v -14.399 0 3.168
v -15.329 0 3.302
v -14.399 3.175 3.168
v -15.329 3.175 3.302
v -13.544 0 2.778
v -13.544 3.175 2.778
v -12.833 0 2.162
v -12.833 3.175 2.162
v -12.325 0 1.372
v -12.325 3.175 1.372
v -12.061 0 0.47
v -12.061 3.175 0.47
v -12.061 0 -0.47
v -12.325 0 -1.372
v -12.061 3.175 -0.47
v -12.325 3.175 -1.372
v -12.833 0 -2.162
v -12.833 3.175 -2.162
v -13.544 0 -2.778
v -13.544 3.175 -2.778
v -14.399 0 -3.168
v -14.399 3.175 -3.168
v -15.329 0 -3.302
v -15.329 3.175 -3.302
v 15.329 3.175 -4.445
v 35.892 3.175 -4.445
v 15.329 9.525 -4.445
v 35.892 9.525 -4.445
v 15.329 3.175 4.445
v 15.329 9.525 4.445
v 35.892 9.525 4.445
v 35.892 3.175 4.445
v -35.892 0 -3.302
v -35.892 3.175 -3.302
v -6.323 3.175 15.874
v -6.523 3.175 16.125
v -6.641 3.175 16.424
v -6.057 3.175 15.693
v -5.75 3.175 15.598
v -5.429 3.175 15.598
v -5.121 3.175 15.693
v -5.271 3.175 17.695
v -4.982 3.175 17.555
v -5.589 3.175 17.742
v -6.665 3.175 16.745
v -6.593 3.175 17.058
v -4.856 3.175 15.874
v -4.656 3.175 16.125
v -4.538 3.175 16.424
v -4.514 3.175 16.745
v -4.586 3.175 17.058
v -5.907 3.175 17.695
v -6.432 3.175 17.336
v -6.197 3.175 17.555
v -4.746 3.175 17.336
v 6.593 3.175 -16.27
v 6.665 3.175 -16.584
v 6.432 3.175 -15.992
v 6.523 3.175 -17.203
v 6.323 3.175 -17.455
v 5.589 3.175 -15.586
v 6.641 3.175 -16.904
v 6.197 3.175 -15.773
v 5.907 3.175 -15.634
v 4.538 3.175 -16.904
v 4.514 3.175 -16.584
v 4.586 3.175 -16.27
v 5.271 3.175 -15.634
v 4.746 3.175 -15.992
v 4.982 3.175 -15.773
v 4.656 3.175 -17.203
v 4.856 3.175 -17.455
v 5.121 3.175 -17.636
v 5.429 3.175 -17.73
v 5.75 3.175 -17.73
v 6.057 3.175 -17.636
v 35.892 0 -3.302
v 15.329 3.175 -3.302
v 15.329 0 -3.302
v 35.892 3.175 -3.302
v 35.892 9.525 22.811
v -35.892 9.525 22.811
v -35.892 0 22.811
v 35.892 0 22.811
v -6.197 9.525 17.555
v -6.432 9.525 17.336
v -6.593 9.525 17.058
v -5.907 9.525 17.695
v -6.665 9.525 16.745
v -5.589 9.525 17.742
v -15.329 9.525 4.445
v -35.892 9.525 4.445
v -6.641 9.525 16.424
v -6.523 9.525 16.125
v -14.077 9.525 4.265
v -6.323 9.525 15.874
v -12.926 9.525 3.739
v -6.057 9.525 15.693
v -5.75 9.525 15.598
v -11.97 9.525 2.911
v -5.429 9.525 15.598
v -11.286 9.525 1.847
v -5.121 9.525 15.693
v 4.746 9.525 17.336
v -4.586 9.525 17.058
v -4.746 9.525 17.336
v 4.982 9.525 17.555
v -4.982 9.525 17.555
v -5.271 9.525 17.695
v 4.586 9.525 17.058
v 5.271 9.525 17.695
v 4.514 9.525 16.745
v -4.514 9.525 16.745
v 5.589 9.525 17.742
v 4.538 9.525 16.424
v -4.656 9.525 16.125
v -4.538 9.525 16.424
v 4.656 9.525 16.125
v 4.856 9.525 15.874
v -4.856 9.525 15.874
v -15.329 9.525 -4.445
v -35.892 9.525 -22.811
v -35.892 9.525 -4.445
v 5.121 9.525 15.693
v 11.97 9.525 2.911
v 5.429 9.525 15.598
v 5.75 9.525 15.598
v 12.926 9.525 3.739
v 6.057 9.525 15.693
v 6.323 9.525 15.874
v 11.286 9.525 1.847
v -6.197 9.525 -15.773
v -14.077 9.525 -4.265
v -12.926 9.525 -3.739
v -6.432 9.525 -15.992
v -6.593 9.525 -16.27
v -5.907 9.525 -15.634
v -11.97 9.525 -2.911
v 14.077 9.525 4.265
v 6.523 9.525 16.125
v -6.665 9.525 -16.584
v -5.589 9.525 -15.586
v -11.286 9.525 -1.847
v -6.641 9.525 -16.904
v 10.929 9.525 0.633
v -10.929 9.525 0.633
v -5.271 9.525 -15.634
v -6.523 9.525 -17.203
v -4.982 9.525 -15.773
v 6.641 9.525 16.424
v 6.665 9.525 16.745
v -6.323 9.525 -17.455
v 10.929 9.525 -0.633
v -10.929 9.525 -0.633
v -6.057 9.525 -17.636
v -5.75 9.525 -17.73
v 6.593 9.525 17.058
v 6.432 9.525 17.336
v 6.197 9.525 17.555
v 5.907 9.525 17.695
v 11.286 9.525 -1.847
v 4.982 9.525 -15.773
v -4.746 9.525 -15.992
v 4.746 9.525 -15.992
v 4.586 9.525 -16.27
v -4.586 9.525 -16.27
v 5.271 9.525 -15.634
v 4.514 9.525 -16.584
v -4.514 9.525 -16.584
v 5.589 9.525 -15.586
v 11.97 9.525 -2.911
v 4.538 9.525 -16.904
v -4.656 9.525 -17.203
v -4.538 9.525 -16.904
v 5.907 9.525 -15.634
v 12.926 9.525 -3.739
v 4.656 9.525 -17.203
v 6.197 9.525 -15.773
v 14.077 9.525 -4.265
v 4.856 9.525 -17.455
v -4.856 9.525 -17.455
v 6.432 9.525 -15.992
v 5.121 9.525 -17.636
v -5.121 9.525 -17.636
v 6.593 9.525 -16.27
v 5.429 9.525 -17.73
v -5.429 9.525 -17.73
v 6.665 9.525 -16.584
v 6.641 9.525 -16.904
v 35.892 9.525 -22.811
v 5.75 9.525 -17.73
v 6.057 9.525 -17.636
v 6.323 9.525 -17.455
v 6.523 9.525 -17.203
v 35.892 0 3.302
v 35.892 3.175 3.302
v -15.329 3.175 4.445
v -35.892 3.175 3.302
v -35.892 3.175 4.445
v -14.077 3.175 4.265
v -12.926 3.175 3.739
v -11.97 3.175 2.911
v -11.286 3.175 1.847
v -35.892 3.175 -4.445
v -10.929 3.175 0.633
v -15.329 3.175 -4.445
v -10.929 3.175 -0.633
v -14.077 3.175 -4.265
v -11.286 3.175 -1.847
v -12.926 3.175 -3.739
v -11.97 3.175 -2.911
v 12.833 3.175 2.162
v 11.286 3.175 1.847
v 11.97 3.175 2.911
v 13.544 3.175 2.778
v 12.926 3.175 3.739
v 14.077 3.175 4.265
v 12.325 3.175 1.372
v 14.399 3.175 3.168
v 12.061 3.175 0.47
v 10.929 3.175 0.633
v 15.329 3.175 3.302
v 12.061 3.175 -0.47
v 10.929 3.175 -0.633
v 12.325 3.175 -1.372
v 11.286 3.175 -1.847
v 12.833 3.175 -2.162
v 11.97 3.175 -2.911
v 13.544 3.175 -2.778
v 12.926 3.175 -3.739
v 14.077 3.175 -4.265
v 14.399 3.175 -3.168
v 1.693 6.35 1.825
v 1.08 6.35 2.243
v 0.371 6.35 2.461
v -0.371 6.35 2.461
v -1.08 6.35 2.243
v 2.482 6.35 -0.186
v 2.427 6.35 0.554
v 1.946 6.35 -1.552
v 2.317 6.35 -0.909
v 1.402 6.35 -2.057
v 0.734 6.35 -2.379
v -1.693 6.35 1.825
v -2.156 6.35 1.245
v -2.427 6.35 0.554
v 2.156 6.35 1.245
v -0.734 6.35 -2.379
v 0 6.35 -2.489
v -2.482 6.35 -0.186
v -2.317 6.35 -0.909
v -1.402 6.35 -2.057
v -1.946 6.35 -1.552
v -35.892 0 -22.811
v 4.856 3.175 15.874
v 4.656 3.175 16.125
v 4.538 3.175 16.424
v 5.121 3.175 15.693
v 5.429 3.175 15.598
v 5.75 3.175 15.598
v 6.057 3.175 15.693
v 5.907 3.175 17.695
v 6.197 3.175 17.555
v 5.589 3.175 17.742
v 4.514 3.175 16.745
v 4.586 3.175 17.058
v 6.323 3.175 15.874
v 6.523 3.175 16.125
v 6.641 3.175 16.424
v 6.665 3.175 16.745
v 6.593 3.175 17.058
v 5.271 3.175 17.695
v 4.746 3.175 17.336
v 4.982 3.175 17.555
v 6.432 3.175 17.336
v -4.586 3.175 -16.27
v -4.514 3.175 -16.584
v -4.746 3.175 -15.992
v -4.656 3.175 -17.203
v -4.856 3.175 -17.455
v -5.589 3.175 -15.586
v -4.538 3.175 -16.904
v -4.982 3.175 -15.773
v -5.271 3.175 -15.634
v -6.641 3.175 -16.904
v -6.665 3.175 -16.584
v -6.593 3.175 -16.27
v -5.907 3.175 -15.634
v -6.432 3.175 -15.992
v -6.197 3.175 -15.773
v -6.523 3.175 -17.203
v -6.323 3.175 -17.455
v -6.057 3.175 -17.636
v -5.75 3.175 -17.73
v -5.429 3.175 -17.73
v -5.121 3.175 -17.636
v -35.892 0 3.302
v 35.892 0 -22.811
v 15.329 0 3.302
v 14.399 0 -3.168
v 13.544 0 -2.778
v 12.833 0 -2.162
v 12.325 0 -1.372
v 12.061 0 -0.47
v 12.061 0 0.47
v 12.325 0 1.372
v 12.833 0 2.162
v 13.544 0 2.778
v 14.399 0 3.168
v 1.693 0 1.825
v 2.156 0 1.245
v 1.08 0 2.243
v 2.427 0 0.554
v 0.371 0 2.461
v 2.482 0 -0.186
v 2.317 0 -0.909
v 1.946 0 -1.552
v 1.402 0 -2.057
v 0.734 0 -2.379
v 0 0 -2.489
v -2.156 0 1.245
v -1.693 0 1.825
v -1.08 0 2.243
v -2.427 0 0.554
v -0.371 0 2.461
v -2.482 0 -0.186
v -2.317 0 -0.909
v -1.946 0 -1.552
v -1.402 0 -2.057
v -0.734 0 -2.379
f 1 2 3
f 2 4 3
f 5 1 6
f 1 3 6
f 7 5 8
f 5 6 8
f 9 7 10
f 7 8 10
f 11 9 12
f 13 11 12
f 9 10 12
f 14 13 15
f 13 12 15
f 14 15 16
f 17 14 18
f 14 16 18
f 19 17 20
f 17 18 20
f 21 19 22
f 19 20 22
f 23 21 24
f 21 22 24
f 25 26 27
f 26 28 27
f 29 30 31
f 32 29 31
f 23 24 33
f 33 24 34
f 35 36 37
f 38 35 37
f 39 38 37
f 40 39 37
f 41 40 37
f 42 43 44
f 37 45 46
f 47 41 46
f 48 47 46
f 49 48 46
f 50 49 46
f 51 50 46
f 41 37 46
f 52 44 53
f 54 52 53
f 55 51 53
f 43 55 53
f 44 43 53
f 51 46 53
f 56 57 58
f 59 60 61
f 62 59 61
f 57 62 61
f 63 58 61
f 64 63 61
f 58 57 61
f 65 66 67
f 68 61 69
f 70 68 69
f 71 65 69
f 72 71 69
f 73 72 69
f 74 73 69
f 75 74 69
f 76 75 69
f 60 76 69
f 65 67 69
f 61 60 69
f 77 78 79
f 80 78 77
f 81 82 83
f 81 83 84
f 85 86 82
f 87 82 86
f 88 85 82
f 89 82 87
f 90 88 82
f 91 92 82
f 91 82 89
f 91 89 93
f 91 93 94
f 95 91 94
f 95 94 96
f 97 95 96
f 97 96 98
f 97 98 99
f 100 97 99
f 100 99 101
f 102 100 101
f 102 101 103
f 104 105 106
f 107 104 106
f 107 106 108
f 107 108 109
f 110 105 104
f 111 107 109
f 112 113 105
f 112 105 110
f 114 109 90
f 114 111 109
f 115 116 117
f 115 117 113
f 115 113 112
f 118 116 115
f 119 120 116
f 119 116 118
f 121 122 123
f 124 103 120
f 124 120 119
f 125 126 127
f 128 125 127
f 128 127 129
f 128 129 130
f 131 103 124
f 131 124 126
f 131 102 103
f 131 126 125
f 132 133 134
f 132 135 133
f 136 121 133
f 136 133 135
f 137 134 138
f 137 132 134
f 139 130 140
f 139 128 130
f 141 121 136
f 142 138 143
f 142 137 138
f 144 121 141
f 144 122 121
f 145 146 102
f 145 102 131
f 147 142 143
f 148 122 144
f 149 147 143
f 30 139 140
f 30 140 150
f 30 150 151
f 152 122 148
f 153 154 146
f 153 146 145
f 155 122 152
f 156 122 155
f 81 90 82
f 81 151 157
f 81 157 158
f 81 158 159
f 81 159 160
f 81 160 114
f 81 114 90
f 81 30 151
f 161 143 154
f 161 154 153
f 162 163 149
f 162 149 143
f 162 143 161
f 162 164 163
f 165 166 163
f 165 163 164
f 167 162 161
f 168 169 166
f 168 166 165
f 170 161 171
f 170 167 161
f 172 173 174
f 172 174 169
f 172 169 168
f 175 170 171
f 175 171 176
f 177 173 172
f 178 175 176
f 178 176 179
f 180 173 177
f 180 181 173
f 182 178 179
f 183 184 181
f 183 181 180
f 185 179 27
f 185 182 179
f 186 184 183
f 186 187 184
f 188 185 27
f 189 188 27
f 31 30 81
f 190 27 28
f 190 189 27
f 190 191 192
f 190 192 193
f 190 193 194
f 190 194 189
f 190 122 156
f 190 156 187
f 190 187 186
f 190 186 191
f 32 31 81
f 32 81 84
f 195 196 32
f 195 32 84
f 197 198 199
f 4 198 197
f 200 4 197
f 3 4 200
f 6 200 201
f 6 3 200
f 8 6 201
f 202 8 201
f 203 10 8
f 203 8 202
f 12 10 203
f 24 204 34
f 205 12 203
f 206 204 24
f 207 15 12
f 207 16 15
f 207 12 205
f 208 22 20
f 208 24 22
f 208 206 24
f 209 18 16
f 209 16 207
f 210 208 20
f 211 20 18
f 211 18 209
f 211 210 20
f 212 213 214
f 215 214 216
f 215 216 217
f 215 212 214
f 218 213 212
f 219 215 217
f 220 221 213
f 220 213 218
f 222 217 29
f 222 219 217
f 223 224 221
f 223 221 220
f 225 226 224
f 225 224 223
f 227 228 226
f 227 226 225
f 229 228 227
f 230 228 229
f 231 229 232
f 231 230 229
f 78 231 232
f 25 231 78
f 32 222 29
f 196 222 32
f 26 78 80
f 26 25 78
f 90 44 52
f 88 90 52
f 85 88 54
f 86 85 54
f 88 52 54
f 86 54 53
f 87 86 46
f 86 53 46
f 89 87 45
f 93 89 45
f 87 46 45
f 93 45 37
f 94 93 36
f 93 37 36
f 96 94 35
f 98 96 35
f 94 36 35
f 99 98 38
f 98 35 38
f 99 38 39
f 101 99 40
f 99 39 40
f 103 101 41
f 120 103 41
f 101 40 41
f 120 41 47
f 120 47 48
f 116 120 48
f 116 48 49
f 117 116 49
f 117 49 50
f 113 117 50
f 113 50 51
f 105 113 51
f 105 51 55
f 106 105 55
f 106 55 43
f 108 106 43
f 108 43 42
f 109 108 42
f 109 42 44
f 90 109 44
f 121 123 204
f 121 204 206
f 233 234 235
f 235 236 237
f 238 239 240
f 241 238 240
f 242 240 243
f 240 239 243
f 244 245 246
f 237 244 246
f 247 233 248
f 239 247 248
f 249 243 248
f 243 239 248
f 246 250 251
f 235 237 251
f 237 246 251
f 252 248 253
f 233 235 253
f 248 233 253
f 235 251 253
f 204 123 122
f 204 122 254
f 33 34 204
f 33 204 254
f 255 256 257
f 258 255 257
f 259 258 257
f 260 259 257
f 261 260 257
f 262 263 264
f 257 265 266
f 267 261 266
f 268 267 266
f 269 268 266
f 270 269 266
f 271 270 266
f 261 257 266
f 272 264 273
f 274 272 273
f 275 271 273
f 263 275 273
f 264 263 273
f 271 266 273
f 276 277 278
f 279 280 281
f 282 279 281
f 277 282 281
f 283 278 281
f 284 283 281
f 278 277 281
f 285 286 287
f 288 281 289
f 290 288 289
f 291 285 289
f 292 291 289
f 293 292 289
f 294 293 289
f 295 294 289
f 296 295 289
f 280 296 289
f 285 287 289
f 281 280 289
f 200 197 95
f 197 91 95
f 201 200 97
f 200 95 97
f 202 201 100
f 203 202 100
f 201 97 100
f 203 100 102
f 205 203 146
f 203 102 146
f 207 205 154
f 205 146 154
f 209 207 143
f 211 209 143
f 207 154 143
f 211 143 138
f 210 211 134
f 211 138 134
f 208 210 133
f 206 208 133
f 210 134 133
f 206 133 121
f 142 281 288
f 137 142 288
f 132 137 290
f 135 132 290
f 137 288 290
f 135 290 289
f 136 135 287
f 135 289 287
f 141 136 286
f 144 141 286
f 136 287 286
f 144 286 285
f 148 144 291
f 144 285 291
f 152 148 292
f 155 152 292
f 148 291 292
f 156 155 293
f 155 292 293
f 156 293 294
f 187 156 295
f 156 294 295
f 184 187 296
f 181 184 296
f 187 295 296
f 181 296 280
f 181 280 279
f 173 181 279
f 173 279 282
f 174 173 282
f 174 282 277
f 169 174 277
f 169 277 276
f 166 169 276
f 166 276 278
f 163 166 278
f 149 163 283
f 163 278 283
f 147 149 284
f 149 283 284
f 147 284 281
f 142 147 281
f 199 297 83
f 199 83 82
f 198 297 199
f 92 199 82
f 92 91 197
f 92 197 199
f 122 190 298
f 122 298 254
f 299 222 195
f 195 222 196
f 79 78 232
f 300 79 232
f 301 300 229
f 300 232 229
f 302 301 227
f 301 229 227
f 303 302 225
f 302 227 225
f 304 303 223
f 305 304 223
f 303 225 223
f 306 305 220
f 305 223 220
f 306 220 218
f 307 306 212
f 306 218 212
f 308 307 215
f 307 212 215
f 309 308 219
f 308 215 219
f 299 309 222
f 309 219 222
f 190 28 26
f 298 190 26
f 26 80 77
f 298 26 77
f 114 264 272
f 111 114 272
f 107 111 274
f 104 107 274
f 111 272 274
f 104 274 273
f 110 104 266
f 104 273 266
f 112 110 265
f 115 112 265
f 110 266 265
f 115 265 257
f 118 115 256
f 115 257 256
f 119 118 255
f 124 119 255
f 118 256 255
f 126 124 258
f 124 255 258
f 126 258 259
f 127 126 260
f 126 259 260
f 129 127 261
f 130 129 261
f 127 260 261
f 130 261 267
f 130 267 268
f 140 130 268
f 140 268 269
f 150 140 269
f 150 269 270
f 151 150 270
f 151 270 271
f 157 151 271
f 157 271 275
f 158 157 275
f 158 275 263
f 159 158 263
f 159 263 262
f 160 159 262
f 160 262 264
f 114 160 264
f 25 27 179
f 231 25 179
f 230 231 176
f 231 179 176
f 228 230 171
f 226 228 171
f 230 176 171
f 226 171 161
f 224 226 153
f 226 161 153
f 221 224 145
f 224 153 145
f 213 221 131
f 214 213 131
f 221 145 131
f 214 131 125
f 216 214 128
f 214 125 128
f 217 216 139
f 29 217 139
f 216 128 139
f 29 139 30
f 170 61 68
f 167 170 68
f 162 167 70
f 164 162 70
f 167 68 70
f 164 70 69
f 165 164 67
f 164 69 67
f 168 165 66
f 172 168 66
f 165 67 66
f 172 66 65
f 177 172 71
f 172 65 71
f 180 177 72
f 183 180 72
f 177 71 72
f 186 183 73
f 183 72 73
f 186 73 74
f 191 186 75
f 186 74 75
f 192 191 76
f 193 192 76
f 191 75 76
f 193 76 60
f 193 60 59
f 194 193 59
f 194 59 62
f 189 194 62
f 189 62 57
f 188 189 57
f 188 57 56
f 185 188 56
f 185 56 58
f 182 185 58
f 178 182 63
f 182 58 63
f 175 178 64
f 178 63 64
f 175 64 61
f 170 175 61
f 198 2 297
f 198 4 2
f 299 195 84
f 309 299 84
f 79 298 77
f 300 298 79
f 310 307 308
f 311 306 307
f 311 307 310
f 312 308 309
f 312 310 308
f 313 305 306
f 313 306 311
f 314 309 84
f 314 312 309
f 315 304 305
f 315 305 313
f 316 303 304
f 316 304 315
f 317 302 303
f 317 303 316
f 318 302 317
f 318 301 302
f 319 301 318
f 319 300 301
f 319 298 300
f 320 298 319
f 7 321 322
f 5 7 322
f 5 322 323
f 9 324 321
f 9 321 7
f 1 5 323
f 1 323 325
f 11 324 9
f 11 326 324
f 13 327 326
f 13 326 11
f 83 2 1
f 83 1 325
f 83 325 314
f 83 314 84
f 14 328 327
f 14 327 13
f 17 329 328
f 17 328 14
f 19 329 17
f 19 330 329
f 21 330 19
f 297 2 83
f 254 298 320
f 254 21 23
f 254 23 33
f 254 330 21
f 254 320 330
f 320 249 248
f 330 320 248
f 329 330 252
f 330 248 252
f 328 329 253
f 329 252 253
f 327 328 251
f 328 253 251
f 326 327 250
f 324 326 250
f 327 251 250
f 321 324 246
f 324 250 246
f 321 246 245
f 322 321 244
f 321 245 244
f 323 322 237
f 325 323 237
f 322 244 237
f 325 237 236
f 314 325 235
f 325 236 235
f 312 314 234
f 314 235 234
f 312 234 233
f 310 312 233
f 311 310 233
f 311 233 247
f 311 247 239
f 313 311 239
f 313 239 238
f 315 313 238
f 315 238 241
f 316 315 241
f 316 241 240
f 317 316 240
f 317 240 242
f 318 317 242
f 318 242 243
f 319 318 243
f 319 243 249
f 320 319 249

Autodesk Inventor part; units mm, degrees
ref_plane "YZ Plane" through (0, 0, 0) normal (1, 0, 0) x (0, 1, 0)
ref_plane "XZ Plane" through (0, 0, 0) normal (0, 1, 0) x (-1, 0, 0)
ref_plane "XY Plane" through (0, 0, 0) normal (0, 0, 1) x (1, 0, 0)
sketch "Sketch1" plane through (0, 0, 0) normal (0, 1, 0) x (-1, 0, 0)
  line L0 (22.9489, 20.701) -> (-22.9489, 20.701)
  line L1 (-22.9489, 20.701) -> (-22.9489, -20.701)
  line L2 (-22.9489, -20.701) -> (22.9489, -20.701)
  line L3 (22.9489, -20.701) -> (22.9489, 20.701)
  line L4 (22.9489, 20.701) -> (-22.9489, -20.701) construction
  line L5 (-22.9489, 20.701) -> (22.9489, -20.701) construction
  point P0 (0, 0)
  dimension "d0" = 45.8978
  dimension "d1" = 41.402
extrude "Extrusion1" add sketch "Sketch1" along normal blind 9.525
hole "Hole1" at (0, 0, 0) direction (0, 1, 0) diameter 4.9784 depth 6.35 thread size "1/4-20 UNC" class "2B" standard "ANSI Unified Screw Threads"
sketch "Sketch11" plane through (-22.9489, 0, 20.701) normal (0, 0, 1) x (1, 0, 0)
  line L0 (45.8978, 9.525) -> (0, 9.525) projected
  line L1 (45.8978, 0) -> (0, 0) projected
  line L2 (0, 9.525) -> (45.8978, 9.525)
  line L3 (45.8978, 9.525) -> (45.8978, 0)
  line L4 (45.8978, 0) -> (0, 0)
  line L5 (0, 0) -> (0, 9.525)
  point P0 (22.9489, 0)
extrude "Extrusion6" cut sketch "Sketch11" against normal blind 3.175
sketch "Sketch12" plane through (22.9489, 0, -20.701) normal (0, 0, -1) x (-1, 0, 0)
  line L0 (0, 9.525) -> (45.8978, 9.525) projected
  line L1 (45.8978, 0) -> (45.8978, 9.525) projected
  line L2 (0, 9.525) -> (45.8978, 9.525)
  line L3 (45.8978, 9.525) -> (45.8978, 0)
  line L4 (45.8978, 0) -> (0, 0)
  line L5 (0, 0) -> (0, 9.525)
  point P0 (22.9489, 0)
extrude "Extrusion7" cut sketch "Sketch12" against normal blind 3.175
sketch "Sketch13" plane through (22.9489, 0, 17.526) normal (1, 0, 0) x (0, 0, -1)
  line L0 (0, 9.525) -> (0, 0) projected
  line L1 (35.052, 0) -> (0, 0) projected
  line L2 (0, 9.525) -> (35.052, 9.525)
  line L3 (35.052, 9.525) -> (35.052, 0)
  line L4 (35.052, 0) -> (0, 0)
  line L5 (0, 0) -> (0, 9.525)
  point P0 (17.526, 0)
extrude "Extrusion8" add sketch "Sketch13" along normal blind 12.9426
sketch "Sketch14" plane through (-22.9489, 0, 17.526) normal (-1, 0, 0) x (0, 0, 1)
  line L0 (-35.052, 9.525) -> (0, 9.525) projected
  line L1 (-35.052, 9.525) -> (0, 9.525)
  line L2 (0, 9.525) -> (0, 0)
  line L3 (0, 0) -> (-35.052, 0)
  line L4 (-35.052, 0) -> (-35.052, 9.525)
  point P0 (-17.526, 0)
extrude "Extrusion9" add sketch "Sketch14" along normal blind 12.9426
sketch "Sketch2" plane through (0, 9.525, 0) normal (0, 1, 0) x (1, 0, 0)
  line L0 (22.9489, -20.701) -> (22.9489, 20.701) projected
  line L1 (-22.9489, -20.701) -> (22.9489, -20.701) projected
  line L2 (22.9489, 20.701) -> (-22.9489, 20.701) projected
  line L3 (-22.9489, 20.701) -> (-22.9489, -20.701) projected
  arc A0 (-15.3289, -3.302) -> (-15.3289, 3.302) centre (-15.3289, 0) ccw
  line L4 (-15.3289, -3.302) -> (-22.9489, -3.302)
  line L5 (-15.3289, 3.302) -> (-22.9489, 3.302)
  arc A1 (15.3289, 3.302) -> (15.3289, -3.302) centre (15.3289, 0) ccw
  line L6 (15.3289, 3.302) -> (22.9489, 3.302)
  line L7 (15.3289, -3.302) -> (22.9489, -3.302)
  line L8 (-22.9489, 4.445) -> (-15.3289, 4.445)
  arc A2 (-15.3289, -4.445) -> (-15.3289, 4.445) centre (-15.3289, 0) ccw
  line L9 (-15.3289, -4.445) -> (-22.9489, -4.445)
  line L10 (22.9489, 4.445) -> (15.3289, 4.445)
  arc A3 (15.3289, 4.445) -> (15.3289, -4.445) centre (15.3289, 0) ccw
  line L11 (15.3289, -4.445) -> (22.9489, -4.445)
  line L12 (22.9489, -4.445) -> (35.8915, -4.445)
  line L13 (35.8915, -17.526) -> (35.8915, 17.526) projected
  line L14 (22.9489, -3.302) -> (35.8915, -3.302)
  line L15 (22.9489, 3.302) -> (35.8915, 3.302)
  line L16 (22.9489, 4.445) -> (35.8915, 4.445)
  line L17 (-22.9489, 4.445) -> (-35.8915, 4.445)
  line L18 (-35.8915, -17.526) -> (-35.8915, 17.526) projected
  line L19 (-22.9489, 3.302) -> (-25.4, 3.302)
  line L20 (-22.9489, -3.302) -> (-35.8915, -3.302)
  line L21 (-22.9489, -4.445) -> (-35.8915, -4.445)
  line L22 (-25.4, 3.302) -> (-35.8915, 3.302)
  point P0 (22.9489, 0)
  point P1 (-22.9489, 0)
  dimension "d21" = 1.143
extrude "Extrusion10" cut sketch "Sketch2" against normal through all contours L7 A1 L6 L0 | L0 L15 L13 L14 | L20 L18 L22 L19 L3 | L3 L5 A0 L4
extrude "Extrusion11" cut sketch "Sketch2" against normal blind 6.35 contours L11 A3 L10 L0 L6 A1 L7 | L0 L14 L13 L12 | L21 L18 L20 L3 | L3 L4 A0 L5 L8 A2 L9 | L0 L16 L13 L15 | L19 L22 L18 L17 L3
sketch "Sketch15" plane through (22.9489, 0, -17.526) normal (0, 0, -1) x (-1, 0, 0)
  line L0 (-12.9426, 9.525) -> (-12.9426, 0) projected
  line L1 (58.8404, 9.525) -> (58.8404, 0) projected
  line L2 (-12.9426, 9.525) -> (58.8404, 9.525)
  line L3 (58.8404, 9.525) -> (58.8404, 0)
  line L4 (58.8404, 0) -> (-12.9426, 0)
  line L5 (-12.9426, 0) -> (-12.9426, 9.525)
  point P0 (22.9489, 0)
extrude "Extrusion12" add sketch "Sketch15" along normal blind 5.285
sketch "Sketch16" plane through (-22.9489, 0, 17.526) normal (0, 0, 1) x (1, 0, 0)
  line L0 (-12.9426, 3.175) -> (-12.9426, 9.525) projected
  line L1 (58.8404, 0) -> (-12.9426, 0) projected
  line L2 (-12.9426, 9.525) -> (58.8404, 9.525)
  line L3 (58.8404, 9.525) -> (58.8404, 0)
  line L4 (58.8404, 0) -> (-12.9426, 0)
  line L5 (-12.9426, 0) -> (-12.9426, 9.525)
  point P0 (22.9489, 0)
extrude "Extrusion13" add sketch "Sketch16" along normal blind 5.285
sketch "Sketch19" plane through (0, 9.525, 0) normal (0, 1, 0) x (1, 0, 0)
  line L0 (-35.8915, 3.302) -> (-35.8915, 22.811) projected
  line L1 (-35.8915, 22.811) -> (-5.5893, 22.811)
  line L2 (-35.8915, 16.6642) -> (-35.8915, 22.811)
  line L3 (35.8915, 22.811) -> (-35.8915, 22.811) projected
  line L4 (35.8915, 22.811) -> (5.5893, 22.811)
  line L5 (35.8915, 16.6642) -> (35.8915, 22.811)
  line L6 (35.8915, -22.811) -> (-35.8915, -22.811) projected
  line L7 (-35.8915, -22.811) -> (-5.5893, -22.811)
  line L8 (-35.8915, -16.6642) -> (-35.8915, -22.811)
  line L9 (35.8915, -22.811) -> (5.5893, -22.811)
  line L10 (35.8915, -16.6642) -> (35.8915, -22.811)
  point P0 (0, 0)
  point P1 (-5.5893, 16.6642)
  point P2 (5.5893, 16.6642)
  point P3 (-5.5893, -16.6642)
  point P4 (5.5893, -16.6642)
hole "Hole2" at (-5.5893, 9.525, 16.6642) at (5.5893, 9.525, 16.6642) at (-5.5893, 9.525, -16.6642) at (5.5893, 9.525, -16.6642) direction (0, -1, 0) diameter 2.1565 depth 6.35 thread size "4-40 UNC" class "2B" standard "ANSI Unified Screw Threads"
properties part number "bottomblock_al_ledgereod" material "Aluminum 6061"
